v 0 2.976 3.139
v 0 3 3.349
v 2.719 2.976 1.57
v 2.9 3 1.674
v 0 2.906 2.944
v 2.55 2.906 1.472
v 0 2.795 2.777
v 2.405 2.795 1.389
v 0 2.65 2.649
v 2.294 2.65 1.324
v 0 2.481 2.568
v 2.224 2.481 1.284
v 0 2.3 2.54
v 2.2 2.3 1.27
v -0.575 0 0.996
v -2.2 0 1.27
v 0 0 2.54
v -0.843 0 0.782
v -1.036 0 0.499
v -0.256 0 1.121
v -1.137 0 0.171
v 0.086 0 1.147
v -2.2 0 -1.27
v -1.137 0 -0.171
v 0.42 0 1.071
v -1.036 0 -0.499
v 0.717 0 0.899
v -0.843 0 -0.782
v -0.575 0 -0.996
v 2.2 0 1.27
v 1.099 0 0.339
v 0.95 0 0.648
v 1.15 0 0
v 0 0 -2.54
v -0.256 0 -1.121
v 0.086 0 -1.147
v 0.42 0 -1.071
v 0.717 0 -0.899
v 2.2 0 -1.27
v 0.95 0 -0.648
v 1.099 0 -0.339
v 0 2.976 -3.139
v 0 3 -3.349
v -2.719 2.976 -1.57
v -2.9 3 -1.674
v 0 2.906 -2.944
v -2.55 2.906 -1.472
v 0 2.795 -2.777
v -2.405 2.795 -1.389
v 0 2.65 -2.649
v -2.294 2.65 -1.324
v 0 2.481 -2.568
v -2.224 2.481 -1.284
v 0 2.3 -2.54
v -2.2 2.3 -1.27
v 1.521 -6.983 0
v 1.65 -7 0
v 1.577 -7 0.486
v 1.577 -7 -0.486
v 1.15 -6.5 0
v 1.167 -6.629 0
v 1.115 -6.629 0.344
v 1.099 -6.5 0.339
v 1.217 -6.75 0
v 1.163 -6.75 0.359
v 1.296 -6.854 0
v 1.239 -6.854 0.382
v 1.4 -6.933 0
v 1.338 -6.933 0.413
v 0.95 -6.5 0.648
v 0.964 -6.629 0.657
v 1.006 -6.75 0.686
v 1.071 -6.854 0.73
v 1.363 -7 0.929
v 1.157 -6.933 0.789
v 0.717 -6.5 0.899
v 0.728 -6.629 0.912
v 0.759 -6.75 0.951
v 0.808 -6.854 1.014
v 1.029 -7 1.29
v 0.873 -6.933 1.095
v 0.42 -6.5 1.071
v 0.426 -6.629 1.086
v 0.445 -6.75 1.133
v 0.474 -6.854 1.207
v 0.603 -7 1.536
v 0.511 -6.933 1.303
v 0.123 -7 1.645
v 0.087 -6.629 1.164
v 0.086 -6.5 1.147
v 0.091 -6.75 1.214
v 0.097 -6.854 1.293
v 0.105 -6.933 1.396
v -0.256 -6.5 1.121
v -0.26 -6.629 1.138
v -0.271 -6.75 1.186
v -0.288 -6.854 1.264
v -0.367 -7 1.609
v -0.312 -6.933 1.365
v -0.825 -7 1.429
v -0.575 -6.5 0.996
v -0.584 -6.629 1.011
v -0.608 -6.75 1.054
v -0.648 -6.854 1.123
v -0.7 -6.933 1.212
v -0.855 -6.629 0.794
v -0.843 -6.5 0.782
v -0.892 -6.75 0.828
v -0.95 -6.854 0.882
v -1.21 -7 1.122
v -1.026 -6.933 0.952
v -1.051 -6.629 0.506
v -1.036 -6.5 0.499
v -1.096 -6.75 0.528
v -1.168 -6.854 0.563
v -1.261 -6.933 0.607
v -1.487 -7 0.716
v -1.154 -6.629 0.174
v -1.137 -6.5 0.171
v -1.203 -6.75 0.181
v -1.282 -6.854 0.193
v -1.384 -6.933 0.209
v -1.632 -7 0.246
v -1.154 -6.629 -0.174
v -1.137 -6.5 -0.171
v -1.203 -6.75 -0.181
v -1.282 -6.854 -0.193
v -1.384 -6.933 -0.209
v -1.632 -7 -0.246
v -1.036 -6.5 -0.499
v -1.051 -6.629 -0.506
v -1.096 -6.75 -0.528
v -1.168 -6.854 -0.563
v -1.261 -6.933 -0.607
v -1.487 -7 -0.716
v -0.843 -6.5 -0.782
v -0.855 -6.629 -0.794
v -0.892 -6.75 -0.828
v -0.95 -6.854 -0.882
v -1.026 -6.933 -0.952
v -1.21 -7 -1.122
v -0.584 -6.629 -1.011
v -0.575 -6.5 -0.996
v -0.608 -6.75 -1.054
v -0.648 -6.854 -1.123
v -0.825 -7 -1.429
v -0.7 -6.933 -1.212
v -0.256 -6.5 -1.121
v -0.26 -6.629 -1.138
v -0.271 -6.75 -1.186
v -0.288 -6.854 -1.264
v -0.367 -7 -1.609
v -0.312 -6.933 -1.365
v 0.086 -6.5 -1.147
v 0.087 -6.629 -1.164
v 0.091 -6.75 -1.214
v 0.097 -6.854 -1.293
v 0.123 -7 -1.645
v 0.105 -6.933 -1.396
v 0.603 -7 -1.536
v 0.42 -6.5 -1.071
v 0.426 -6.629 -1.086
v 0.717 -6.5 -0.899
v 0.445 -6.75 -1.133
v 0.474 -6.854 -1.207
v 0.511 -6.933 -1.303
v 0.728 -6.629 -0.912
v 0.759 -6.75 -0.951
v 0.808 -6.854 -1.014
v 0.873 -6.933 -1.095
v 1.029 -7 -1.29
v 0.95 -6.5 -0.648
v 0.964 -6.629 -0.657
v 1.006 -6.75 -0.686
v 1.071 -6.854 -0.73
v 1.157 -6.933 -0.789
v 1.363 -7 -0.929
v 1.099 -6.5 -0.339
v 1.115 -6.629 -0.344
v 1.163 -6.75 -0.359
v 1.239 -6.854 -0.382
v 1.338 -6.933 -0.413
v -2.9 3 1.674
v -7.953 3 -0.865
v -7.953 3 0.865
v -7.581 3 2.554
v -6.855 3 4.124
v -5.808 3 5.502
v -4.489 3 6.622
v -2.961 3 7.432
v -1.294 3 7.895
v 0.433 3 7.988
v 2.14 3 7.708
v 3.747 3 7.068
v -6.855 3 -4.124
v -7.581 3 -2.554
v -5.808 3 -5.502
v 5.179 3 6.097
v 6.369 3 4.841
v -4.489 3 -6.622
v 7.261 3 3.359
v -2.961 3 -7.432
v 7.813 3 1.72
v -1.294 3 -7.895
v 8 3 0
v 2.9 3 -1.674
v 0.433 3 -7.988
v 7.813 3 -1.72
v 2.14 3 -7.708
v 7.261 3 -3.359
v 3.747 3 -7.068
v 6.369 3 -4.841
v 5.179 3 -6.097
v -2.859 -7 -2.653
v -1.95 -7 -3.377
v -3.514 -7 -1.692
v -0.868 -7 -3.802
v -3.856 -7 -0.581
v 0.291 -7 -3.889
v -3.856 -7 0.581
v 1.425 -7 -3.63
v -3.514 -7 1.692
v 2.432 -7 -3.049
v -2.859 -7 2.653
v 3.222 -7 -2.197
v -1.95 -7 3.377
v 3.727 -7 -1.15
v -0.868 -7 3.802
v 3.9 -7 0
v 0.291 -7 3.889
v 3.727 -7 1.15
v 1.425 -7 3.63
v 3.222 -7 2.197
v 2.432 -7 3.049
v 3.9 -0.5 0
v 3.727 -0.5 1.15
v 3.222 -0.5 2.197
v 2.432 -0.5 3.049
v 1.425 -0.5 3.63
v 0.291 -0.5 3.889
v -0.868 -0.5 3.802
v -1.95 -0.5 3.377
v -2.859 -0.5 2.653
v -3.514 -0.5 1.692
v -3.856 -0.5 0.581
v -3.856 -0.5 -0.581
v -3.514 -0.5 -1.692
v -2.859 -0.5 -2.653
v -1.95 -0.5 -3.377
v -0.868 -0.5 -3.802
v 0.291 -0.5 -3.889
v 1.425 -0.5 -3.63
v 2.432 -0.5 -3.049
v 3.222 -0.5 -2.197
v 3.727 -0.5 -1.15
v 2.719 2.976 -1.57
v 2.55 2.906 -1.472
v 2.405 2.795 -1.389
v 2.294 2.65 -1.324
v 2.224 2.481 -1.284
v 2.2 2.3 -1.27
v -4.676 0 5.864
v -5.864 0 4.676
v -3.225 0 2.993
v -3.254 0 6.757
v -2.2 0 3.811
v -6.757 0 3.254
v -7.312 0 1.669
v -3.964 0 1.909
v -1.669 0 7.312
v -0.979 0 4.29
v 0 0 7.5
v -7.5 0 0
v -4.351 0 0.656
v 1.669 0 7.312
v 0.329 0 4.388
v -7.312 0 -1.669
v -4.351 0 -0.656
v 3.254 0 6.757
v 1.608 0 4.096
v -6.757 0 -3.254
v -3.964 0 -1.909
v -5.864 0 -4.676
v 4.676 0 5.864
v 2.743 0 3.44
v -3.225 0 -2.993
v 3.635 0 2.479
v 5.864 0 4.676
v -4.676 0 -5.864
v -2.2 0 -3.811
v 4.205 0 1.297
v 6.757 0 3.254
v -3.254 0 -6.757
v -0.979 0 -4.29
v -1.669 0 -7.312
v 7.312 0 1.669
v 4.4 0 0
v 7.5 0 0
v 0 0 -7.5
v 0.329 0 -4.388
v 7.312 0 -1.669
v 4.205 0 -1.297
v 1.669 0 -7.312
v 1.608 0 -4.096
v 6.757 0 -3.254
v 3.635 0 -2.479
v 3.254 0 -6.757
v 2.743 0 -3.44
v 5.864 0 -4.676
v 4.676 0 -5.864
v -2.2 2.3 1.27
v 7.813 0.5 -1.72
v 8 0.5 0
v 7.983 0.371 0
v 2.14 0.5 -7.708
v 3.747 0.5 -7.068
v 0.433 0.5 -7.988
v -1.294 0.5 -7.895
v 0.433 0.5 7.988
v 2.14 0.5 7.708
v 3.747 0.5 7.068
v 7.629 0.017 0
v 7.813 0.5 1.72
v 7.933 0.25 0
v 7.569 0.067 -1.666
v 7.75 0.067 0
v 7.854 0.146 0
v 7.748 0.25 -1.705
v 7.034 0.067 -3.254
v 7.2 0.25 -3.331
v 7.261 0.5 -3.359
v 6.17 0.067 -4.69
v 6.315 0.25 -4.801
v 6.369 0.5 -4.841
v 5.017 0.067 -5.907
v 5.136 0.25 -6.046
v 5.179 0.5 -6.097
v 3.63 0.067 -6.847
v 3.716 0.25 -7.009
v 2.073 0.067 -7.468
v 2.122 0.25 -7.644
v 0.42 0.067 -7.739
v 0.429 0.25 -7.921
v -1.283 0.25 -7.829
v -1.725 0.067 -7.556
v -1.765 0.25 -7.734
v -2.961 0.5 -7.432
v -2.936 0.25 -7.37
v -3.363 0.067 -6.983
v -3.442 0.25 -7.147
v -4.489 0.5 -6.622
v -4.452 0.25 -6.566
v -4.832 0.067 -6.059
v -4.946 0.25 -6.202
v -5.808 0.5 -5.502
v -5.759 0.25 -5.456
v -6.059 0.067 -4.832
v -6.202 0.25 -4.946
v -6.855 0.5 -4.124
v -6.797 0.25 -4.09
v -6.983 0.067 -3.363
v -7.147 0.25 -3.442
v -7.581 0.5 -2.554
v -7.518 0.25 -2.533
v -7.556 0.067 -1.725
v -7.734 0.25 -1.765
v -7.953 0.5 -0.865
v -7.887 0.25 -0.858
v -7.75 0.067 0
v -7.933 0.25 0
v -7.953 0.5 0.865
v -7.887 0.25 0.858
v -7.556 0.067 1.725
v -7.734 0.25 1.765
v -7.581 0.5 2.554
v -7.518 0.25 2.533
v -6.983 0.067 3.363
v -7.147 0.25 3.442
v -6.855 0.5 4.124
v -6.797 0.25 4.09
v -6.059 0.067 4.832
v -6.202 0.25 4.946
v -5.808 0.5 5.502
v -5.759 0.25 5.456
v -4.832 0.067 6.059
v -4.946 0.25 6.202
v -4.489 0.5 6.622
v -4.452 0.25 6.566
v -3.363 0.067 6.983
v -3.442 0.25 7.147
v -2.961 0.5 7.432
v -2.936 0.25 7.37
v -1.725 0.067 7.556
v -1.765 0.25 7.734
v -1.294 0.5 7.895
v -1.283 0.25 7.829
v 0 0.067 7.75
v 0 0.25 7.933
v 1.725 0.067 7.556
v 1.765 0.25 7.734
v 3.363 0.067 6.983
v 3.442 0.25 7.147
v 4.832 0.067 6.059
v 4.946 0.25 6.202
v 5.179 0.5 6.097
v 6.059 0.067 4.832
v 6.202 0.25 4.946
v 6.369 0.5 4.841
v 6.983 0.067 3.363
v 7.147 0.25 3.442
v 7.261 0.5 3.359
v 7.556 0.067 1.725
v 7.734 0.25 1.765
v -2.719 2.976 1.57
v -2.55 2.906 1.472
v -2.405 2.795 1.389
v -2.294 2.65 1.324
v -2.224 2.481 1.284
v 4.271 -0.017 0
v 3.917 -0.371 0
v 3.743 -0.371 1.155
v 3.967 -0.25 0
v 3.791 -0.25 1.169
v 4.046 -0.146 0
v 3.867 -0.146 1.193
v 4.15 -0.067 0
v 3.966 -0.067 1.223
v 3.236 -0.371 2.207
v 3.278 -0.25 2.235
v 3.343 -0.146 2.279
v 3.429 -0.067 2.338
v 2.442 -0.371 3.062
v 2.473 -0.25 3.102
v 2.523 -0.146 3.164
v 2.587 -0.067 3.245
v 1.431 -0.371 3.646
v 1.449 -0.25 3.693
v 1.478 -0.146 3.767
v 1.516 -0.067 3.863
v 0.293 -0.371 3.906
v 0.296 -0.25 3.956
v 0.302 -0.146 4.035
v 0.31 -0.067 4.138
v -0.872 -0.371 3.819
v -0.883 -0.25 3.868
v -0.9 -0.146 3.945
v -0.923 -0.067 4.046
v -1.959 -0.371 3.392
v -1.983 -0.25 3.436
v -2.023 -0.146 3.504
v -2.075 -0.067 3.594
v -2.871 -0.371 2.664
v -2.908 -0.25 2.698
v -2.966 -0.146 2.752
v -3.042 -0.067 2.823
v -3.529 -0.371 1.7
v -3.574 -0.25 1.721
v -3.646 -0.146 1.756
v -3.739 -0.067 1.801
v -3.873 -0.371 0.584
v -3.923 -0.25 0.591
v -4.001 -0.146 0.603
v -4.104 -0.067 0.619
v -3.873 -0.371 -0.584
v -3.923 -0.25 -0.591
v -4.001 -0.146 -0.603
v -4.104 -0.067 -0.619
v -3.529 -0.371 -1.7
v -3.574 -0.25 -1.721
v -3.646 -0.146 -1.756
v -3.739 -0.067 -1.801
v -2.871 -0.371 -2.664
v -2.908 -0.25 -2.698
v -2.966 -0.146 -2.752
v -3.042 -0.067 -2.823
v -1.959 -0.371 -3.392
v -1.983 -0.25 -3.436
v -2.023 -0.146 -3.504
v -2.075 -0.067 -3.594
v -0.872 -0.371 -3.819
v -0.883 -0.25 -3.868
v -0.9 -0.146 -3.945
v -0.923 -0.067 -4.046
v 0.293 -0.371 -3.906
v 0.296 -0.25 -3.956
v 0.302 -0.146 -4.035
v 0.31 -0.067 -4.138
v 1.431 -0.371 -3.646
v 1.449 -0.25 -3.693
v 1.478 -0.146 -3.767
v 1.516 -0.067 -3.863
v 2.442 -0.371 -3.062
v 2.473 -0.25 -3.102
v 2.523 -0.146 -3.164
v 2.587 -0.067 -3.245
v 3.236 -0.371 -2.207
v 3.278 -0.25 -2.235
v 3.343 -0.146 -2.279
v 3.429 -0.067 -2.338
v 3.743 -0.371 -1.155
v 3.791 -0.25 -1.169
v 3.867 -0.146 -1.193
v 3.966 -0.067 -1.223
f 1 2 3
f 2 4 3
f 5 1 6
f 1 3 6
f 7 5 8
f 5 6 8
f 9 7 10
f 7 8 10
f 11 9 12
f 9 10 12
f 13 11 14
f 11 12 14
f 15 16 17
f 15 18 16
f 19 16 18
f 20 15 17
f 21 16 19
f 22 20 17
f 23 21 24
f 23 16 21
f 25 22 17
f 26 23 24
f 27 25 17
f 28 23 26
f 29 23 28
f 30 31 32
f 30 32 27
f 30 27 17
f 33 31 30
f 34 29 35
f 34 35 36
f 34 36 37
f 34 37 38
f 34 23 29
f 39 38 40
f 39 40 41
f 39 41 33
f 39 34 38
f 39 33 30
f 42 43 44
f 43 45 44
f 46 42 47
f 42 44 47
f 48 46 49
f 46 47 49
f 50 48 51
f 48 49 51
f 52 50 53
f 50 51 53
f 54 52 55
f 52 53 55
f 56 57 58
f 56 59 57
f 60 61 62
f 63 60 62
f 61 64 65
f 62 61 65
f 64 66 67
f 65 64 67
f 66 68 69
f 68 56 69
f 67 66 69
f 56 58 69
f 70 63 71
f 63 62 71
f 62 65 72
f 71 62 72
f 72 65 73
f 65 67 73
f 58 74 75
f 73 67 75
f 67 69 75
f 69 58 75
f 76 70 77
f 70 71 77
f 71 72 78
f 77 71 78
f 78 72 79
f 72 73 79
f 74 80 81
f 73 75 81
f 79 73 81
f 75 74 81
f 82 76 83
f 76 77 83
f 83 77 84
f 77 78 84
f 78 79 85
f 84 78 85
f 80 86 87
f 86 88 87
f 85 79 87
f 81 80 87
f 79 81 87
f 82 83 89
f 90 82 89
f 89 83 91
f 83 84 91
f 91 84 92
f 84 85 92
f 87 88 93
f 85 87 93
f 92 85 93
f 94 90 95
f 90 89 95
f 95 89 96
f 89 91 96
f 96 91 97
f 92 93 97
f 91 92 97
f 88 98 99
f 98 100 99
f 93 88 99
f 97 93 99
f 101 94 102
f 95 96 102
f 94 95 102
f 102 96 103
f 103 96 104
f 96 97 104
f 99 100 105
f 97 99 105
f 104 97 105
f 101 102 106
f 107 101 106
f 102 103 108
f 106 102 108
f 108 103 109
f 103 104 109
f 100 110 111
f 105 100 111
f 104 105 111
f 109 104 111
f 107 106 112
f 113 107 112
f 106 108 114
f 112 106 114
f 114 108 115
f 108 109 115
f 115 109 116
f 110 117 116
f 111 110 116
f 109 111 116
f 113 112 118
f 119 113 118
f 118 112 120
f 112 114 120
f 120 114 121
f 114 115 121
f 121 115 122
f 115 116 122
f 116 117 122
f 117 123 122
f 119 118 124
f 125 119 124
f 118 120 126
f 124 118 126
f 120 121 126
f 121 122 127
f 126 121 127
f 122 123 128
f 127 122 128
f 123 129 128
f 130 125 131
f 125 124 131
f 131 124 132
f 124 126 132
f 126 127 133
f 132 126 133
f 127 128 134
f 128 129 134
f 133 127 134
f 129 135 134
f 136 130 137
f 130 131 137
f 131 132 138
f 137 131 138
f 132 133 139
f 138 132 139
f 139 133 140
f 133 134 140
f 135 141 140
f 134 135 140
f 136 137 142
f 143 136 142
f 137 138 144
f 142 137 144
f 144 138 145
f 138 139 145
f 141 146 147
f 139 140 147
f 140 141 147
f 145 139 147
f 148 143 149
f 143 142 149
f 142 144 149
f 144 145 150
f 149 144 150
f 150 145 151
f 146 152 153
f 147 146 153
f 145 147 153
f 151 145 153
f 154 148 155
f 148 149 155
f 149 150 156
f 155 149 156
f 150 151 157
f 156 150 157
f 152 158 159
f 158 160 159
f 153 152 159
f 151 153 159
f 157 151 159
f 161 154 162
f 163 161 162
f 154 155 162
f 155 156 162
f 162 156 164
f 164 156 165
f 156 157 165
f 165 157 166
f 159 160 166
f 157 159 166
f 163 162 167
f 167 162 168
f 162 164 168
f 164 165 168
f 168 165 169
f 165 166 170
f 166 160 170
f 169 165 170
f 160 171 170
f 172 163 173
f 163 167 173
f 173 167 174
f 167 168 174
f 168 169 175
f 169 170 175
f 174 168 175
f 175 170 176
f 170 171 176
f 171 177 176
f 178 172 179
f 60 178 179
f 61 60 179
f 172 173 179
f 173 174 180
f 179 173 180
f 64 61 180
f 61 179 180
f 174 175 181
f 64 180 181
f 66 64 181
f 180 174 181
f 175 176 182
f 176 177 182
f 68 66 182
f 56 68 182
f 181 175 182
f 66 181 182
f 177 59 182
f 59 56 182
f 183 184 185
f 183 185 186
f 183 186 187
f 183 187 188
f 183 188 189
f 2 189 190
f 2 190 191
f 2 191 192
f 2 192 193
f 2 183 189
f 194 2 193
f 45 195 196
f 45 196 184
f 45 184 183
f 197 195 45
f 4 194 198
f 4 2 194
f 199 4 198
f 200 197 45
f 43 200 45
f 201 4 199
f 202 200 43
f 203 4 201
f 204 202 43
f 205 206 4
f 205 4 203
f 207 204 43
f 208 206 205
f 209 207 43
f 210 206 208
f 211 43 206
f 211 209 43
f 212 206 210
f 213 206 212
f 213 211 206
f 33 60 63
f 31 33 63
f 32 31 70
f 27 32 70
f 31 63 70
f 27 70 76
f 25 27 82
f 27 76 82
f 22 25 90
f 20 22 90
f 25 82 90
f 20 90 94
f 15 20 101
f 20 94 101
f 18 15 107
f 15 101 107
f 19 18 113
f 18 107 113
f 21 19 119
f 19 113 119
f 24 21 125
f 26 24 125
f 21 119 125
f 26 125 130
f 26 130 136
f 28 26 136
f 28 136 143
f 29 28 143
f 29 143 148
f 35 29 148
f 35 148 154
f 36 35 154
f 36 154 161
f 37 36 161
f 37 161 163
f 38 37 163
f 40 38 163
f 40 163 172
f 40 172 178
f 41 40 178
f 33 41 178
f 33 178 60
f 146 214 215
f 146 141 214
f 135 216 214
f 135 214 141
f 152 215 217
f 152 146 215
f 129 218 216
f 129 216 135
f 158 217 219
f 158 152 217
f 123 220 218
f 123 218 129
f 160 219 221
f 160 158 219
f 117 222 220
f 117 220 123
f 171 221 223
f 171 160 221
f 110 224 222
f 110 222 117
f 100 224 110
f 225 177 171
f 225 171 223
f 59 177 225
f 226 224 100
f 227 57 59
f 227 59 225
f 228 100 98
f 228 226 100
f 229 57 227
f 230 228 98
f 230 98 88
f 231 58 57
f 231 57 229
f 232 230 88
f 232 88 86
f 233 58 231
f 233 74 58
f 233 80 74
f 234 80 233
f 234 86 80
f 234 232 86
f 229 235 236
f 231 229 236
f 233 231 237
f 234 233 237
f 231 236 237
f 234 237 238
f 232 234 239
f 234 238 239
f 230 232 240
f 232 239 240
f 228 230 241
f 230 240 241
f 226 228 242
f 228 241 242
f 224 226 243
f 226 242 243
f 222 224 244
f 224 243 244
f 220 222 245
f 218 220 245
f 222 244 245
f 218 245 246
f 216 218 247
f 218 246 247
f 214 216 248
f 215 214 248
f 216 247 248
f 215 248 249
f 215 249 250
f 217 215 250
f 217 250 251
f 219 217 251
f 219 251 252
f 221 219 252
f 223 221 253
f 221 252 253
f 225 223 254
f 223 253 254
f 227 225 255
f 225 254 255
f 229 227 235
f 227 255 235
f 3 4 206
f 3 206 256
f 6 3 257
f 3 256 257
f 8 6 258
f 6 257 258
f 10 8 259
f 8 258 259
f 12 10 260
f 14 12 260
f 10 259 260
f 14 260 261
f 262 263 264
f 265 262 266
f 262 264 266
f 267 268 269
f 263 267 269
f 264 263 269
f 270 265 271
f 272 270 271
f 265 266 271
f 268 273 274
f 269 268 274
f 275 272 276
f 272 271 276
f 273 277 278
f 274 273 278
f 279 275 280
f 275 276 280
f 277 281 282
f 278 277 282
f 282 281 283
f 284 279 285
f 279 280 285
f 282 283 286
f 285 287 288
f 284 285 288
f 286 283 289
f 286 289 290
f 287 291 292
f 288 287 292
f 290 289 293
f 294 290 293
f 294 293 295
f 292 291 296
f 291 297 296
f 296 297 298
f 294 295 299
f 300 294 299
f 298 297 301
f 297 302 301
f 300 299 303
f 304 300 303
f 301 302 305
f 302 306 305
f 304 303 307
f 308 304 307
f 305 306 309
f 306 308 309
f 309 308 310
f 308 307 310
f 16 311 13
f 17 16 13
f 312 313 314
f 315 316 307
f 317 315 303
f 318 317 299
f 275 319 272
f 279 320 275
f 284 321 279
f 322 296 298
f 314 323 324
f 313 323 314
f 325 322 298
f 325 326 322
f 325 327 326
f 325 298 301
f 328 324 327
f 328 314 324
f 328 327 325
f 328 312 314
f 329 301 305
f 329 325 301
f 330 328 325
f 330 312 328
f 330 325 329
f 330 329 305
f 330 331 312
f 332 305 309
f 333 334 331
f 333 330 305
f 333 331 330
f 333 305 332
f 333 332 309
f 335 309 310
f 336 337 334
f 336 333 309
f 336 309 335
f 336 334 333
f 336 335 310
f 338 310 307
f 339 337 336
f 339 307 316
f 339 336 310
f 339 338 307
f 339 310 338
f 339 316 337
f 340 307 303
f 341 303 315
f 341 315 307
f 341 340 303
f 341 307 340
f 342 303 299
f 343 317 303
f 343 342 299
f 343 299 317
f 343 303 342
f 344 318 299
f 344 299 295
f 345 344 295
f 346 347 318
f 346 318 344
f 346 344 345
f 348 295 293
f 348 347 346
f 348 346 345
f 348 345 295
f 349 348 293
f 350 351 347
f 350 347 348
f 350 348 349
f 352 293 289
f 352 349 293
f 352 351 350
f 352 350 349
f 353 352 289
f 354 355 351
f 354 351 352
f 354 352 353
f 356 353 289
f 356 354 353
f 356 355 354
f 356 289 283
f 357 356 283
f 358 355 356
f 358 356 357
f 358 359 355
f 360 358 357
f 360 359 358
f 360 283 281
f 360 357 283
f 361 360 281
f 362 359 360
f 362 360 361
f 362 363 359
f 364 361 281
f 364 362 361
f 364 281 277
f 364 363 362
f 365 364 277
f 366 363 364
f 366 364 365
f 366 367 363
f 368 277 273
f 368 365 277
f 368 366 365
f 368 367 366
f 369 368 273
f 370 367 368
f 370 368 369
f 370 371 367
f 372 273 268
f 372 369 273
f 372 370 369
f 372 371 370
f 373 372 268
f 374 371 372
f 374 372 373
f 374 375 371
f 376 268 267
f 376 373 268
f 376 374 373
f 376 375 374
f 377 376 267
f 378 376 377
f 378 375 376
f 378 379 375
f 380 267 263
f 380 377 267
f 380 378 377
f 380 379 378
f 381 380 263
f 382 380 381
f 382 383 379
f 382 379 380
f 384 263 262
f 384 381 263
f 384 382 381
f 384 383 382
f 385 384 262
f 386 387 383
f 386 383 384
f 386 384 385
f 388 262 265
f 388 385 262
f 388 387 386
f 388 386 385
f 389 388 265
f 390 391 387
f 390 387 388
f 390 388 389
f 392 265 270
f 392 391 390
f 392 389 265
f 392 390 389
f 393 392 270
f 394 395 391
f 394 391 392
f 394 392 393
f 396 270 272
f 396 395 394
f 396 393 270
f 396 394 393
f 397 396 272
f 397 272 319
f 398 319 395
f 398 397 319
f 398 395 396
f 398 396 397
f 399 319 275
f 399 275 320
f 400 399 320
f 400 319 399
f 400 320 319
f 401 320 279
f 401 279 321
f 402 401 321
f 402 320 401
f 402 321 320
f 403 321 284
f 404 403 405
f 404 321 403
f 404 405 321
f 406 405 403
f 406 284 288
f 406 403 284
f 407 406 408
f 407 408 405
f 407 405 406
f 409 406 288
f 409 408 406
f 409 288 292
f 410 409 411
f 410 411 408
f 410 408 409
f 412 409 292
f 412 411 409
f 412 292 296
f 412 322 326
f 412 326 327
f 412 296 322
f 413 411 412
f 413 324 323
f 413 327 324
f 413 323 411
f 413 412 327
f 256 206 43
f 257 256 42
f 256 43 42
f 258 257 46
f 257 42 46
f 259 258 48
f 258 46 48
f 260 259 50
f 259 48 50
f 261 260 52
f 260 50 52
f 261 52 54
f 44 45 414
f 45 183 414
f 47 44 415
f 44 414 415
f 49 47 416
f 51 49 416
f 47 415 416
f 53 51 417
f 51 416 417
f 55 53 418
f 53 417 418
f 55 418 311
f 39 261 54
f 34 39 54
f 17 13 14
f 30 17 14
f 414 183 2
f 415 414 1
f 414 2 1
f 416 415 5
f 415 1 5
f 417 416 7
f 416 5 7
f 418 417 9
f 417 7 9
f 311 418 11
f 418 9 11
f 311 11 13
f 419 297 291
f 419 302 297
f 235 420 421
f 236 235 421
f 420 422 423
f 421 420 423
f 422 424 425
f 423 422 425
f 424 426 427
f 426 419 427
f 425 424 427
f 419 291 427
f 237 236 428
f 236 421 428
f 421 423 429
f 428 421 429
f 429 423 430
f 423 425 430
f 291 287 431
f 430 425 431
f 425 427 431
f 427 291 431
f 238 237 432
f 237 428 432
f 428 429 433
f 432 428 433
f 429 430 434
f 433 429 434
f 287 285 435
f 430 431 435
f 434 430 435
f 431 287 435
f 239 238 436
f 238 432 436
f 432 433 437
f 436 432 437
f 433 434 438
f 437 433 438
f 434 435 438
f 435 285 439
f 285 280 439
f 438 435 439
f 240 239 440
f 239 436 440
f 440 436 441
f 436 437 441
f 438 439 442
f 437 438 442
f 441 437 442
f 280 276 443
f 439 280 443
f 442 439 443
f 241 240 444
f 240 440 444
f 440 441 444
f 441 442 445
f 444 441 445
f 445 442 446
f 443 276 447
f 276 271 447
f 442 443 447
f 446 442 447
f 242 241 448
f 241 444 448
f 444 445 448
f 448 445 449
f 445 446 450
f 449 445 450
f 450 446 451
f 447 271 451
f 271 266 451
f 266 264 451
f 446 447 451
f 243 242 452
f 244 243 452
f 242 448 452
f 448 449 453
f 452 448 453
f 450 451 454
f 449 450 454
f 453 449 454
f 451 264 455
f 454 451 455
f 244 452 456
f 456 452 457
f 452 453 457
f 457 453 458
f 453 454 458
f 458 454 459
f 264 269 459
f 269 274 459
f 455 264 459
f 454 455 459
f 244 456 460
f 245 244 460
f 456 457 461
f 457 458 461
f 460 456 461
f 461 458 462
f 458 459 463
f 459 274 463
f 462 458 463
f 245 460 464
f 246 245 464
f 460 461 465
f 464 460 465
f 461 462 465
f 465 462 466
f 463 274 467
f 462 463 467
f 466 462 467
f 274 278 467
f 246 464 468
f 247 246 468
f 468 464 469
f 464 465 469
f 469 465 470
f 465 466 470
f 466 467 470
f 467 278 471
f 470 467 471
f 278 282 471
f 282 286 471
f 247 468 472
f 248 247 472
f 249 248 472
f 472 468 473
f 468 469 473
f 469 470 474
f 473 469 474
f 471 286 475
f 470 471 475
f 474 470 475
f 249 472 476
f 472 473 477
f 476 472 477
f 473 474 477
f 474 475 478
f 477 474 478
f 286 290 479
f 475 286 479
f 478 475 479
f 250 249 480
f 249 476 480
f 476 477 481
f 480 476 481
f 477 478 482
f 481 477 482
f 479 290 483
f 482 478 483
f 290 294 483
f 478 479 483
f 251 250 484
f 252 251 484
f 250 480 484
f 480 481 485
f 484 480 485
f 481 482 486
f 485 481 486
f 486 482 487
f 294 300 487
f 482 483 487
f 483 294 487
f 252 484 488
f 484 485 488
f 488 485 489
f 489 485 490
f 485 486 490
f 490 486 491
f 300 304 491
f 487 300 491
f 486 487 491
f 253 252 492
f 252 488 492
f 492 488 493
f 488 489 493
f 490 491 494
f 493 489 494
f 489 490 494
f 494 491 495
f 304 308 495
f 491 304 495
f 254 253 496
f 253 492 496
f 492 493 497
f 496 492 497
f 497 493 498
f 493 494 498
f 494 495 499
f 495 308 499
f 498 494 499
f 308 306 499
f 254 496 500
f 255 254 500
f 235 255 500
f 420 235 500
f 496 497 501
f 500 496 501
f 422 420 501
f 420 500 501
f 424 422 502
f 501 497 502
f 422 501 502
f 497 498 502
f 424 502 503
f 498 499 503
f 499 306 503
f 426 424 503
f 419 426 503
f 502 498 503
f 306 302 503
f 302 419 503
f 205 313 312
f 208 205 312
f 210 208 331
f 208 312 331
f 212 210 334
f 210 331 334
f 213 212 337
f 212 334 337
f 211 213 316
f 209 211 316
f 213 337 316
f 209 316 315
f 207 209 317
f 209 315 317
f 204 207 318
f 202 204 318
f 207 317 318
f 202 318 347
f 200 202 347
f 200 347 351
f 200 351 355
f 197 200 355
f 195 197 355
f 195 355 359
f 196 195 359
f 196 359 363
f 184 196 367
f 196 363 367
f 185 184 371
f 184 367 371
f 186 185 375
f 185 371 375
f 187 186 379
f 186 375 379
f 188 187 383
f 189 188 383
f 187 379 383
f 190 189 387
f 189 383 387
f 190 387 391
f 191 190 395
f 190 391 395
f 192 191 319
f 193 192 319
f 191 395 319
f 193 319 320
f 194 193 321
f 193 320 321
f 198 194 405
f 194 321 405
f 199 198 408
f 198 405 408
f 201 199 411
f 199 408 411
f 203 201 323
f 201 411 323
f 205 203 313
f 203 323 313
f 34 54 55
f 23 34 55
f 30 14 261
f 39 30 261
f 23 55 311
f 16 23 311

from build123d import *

# Parameters (mm, degrees)
SKETCH1_R           = 8
BOSS_EXTRUDE1_DEPTH = 3
SKETCH2_R           = 3.9
BOSS_EXTRUDE2_DEPTH = 7
SKETCH3_R           = 1.15
CUT_EXTRUDE3_DEPTH  = 12
CUT_EXTRUDE4_DEPTH  = 3
FILLET1_R           = 0.7
FILLET2_R           = 0.5
FILLET3_R           = 0.5


with BuildPart() as part:
    # Sketch1 → Boss-Extrude1 (new body)
    with BuildSketch(Plane(origin=(0, 0, 0), x_dir=(1, 0, 0), z_dir=(0, 1, 0))):
        Circle(SKETCH1_R)
    extrude(amount=BOSS_EXTRUDE1_DEPTH)

    # Sketch2 → Boss-Extrude2 (add)
    with BuildSketch(Plane.XZ):
        Circle(SKETCH2_R)
    extrude(amount=BOSS_EXTRUDE2_DEPTH)

    # Sketch3 → Cut-Extrude3 (cut)
    with BuildSketch(Plane.XZ.offset(7)):
        Circle(SKETCH3_R)
    extrude(amount=-CUT_EXTRUDE3_DEPTH, mode=Mode.SUBTRACT)

    # Sketch6 → Cut-Extrude4 (cut)
    with BuildSketch(Plane(origin=(0, 3, 0), x_dir=(1, 0, 0), z_dir=(0, 1, 0))):
        Polygon((0, 2.540341184), (-2.2, 1.270170592), (-2.2, -1.270170592), (0, -2.540341184), (2.2, -1.270170592), (2.2, 1.270170592), align=None)
    extrude(amount=-CUT_EXTRUDE4_DEPTH, mode=Mode.SUBTRACT)

    # Fillet1
    fillet1_edges = [part.edges().sort_by_distance(p)[0] for p in [
        (1.1, 3, -1.905255888),
        (-1.1, 3, -1.905255888),
        (-2.2, 3, 0),
        (-1.1, 3, 1.905255888),
        (1.1, 3, 1.905255888),
        (2.2, 3, 0),
    ]]
    fillet(fillet1_edges, radius=FILLET1_R)

    # Fillet2
    fillet2_edges = [part.edges().sort_by_distance(p)[0] for p in [
        (-1.15, -7, 0),
    ]]
    fillet(fillet2_edges, radius=FILLET2_R)

    # Fillet3
    fillet3_edges = [part.edges().sort_by_distance(p)[0] for p in [
        (-8, 0, 0),
        (-3.9, 0, 0),
    ]]
    fillet(fillet3_edges, radius=FILLET3_R)


solid = part.part
